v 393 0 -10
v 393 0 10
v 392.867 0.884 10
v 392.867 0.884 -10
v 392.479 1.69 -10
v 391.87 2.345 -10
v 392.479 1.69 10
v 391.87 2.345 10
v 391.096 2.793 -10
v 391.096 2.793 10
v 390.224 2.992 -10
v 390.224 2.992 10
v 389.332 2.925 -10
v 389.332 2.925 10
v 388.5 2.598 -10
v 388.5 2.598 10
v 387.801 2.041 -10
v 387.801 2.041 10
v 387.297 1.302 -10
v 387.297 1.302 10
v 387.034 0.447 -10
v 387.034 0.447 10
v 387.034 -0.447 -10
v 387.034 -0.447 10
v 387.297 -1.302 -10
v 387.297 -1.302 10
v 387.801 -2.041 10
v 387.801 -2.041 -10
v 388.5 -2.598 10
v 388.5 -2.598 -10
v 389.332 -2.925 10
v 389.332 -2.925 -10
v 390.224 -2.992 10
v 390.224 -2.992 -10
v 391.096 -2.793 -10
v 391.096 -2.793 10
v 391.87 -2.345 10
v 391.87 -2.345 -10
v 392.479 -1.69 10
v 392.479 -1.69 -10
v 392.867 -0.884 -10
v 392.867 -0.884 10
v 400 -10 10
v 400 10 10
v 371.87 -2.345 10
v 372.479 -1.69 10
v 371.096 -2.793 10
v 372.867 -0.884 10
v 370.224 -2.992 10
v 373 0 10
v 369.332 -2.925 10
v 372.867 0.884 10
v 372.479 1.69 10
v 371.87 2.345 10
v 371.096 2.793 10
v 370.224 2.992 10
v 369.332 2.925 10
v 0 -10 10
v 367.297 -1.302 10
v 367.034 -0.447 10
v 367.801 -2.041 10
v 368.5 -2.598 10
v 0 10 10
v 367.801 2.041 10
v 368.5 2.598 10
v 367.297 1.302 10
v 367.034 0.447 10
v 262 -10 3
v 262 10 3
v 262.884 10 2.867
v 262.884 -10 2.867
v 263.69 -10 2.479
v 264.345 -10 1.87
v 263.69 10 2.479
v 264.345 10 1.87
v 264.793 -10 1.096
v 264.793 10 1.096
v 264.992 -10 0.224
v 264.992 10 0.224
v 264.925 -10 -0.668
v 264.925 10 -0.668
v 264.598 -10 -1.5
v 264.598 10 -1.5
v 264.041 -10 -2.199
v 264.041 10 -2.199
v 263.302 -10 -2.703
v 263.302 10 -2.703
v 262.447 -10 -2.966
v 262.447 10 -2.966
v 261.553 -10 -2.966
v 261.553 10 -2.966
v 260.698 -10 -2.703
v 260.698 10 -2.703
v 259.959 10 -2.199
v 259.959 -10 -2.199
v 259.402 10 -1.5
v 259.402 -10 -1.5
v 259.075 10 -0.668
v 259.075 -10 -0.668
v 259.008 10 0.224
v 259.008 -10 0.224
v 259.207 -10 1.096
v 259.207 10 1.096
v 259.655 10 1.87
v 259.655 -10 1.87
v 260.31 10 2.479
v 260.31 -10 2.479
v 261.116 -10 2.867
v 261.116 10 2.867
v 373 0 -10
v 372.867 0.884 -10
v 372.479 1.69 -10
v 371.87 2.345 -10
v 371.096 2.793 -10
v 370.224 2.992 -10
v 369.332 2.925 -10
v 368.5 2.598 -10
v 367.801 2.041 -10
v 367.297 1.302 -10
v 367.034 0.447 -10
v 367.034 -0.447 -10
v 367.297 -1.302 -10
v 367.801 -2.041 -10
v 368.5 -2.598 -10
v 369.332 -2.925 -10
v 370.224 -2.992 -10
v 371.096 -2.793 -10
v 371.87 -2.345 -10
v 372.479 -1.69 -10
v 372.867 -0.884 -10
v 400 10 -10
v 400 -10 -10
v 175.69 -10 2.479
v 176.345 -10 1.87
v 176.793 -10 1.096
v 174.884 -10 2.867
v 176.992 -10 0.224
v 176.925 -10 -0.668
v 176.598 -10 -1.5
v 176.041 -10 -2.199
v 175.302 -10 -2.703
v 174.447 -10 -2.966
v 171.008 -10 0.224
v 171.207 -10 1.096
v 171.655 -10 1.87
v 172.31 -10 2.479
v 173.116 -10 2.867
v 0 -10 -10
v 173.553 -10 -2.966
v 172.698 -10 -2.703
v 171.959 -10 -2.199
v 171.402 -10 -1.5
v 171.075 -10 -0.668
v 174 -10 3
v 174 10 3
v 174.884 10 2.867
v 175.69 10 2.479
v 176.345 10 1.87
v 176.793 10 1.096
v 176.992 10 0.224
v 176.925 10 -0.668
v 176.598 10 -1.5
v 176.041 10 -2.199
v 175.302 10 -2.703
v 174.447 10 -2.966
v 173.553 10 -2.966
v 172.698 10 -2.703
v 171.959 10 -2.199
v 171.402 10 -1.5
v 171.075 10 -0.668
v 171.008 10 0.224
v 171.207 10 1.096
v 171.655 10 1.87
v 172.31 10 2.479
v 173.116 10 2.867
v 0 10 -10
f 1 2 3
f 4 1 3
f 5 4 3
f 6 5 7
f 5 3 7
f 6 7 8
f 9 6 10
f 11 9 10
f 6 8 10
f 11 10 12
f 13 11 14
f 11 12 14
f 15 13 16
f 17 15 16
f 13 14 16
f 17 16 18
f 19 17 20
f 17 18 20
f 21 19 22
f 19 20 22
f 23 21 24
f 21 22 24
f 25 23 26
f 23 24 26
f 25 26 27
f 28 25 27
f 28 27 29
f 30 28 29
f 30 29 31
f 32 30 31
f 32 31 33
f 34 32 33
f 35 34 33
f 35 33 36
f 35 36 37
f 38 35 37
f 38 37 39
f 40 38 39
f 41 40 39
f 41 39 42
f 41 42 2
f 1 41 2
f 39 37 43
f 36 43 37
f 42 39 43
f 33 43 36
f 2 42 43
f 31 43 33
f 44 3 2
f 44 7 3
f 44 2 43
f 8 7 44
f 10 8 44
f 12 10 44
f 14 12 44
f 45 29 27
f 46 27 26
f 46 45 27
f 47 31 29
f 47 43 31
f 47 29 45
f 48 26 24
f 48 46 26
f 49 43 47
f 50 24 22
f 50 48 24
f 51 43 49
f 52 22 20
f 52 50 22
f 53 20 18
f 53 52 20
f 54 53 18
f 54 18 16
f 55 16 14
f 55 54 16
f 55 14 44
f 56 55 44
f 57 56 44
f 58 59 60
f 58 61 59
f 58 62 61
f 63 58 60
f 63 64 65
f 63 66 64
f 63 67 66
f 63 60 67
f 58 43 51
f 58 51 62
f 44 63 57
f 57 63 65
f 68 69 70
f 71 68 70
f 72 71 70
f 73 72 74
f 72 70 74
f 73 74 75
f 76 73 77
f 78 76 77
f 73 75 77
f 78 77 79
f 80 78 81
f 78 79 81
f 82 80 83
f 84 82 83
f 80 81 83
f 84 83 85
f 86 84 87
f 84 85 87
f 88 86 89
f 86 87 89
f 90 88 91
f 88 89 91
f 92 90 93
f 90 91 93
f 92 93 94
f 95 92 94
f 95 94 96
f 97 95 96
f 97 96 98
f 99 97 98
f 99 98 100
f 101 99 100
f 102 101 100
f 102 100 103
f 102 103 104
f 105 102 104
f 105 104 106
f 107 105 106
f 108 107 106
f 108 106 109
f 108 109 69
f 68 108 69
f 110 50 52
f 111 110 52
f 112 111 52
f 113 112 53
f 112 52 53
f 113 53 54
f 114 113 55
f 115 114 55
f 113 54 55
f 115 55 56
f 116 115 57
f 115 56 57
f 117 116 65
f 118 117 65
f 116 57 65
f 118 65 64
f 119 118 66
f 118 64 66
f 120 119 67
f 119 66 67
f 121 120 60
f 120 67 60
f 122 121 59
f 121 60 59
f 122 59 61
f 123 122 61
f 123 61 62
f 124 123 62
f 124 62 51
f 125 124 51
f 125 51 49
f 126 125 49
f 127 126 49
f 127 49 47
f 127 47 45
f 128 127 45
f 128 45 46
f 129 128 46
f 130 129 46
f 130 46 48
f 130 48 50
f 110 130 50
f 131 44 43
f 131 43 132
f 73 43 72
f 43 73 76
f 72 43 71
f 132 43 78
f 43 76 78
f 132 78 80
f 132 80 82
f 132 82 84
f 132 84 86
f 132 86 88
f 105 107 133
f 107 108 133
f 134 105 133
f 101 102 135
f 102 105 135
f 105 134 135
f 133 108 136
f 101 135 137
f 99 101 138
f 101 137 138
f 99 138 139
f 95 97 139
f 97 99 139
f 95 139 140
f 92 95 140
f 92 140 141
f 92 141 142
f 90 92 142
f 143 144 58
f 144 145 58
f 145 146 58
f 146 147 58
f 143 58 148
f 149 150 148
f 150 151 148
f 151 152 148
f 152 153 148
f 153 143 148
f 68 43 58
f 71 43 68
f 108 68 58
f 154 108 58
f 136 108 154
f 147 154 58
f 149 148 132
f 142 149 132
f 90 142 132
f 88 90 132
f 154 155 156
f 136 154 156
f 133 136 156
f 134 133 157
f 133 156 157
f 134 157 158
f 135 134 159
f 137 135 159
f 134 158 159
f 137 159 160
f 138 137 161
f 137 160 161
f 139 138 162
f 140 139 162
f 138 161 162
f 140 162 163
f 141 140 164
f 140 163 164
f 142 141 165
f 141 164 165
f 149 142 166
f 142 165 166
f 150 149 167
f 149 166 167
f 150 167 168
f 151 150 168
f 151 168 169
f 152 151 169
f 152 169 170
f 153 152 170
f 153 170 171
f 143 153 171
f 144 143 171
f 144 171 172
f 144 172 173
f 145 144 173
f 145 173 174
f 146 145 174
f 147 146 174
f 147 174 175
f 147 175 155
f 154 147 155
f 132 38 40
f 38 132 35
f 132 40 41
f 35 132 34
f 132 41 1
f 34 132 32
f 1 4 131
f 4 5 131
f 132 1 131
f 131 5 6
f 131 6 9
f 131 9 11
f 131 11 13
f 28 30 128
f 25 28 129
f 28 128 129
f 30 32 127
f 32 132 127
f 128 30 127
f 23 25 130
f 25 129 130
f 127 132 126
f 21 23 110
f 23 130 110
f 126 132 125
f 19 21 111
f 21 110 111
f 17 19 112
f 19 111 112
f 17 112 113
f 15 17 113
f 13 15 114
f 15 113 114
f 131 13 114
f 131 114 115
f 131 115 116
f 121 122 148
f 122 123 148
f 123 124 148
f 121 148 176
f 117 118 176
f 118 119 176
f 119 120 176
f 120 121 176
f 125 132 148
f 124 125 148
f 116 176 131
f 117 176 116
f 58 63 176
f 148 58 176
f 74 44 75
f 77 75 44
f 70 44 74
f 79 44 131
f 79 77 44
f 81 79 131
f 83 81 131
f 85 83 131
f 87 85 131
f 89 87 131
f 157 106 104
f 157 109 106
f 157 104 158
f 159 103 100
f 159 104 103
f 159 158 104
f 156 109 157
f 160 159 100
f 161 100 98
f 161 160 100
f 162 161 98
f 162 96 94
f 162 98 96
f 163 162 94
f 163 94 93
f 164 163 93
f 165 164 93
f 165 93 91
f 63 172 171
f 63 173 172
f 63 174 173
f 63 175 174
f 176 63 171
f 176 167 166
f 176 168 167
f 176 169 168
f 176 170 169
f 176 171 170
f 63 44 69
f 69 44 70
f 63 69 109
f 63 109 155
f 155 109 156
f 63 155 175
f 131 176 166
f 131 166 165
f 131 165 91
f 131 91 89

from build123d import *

# Parameters (mm, degrees)
SKIZZE1_W                       = 20
SKIZZE1_H                       = 20
AUFSATZ_LINEAR_AUSTRAGEN1_DEPTH = 400
SKIZZE2_R                       = 3
SCHNITT_LINEAR_AUSTRAGEN1_DEPTH = 401.62451248
SKETCH1_R                       = 3
EXTRUDE1_DEPTH                  = 401.62451248


with BuildPart() as part:
    # Skizze1 → Aufsatz-Linear austragen1 (new body)
    with BuildSketch(Plane(origin=(0, 0, 0), x_dir=(0, 0, -1), z_dir=(1, 0, 0))):
        Rectangle(SKIZZE1_W, SKIZZE1_H)
    extrude(amount=AUFSATZ_LINEAR_AUSTRAGEN1_DEPTH)

    # Skizze2 → Schnitt-Linear austragen1 (cut, through all)
    with BuildSketch(Plane(origin=(0, 10, 0), x_dir=(1, 0, 0), z_dir=(0, 1, 0))):
        with Locations(Location((174, 0, 0), (0, 0, 270))):
            Circle(SKIZZE2_R)
        with Locations(Location((262, 0, 0), (0, 0, 270))):
            Circle(SKIZZE2_R)
    extrude(amount=-SCHNITT_LINEAR_AUSTRAGEN1_DEPTH, mode=Mode.SUBTRACT)

    # Sketch1 → Extrude1 (cut, through all)
    with BuildSketch(Plane.XY.offset(10)):
        with Locations((390, 0)):
            Circle(SKETCH1_R)
        with Locations((370, 0)):
            Circle(SKETCH1_R)
    extrude(amount=-EXTRUDE1_DEPTH, mode=Mode.SUBTRACT)


solid = part.part
